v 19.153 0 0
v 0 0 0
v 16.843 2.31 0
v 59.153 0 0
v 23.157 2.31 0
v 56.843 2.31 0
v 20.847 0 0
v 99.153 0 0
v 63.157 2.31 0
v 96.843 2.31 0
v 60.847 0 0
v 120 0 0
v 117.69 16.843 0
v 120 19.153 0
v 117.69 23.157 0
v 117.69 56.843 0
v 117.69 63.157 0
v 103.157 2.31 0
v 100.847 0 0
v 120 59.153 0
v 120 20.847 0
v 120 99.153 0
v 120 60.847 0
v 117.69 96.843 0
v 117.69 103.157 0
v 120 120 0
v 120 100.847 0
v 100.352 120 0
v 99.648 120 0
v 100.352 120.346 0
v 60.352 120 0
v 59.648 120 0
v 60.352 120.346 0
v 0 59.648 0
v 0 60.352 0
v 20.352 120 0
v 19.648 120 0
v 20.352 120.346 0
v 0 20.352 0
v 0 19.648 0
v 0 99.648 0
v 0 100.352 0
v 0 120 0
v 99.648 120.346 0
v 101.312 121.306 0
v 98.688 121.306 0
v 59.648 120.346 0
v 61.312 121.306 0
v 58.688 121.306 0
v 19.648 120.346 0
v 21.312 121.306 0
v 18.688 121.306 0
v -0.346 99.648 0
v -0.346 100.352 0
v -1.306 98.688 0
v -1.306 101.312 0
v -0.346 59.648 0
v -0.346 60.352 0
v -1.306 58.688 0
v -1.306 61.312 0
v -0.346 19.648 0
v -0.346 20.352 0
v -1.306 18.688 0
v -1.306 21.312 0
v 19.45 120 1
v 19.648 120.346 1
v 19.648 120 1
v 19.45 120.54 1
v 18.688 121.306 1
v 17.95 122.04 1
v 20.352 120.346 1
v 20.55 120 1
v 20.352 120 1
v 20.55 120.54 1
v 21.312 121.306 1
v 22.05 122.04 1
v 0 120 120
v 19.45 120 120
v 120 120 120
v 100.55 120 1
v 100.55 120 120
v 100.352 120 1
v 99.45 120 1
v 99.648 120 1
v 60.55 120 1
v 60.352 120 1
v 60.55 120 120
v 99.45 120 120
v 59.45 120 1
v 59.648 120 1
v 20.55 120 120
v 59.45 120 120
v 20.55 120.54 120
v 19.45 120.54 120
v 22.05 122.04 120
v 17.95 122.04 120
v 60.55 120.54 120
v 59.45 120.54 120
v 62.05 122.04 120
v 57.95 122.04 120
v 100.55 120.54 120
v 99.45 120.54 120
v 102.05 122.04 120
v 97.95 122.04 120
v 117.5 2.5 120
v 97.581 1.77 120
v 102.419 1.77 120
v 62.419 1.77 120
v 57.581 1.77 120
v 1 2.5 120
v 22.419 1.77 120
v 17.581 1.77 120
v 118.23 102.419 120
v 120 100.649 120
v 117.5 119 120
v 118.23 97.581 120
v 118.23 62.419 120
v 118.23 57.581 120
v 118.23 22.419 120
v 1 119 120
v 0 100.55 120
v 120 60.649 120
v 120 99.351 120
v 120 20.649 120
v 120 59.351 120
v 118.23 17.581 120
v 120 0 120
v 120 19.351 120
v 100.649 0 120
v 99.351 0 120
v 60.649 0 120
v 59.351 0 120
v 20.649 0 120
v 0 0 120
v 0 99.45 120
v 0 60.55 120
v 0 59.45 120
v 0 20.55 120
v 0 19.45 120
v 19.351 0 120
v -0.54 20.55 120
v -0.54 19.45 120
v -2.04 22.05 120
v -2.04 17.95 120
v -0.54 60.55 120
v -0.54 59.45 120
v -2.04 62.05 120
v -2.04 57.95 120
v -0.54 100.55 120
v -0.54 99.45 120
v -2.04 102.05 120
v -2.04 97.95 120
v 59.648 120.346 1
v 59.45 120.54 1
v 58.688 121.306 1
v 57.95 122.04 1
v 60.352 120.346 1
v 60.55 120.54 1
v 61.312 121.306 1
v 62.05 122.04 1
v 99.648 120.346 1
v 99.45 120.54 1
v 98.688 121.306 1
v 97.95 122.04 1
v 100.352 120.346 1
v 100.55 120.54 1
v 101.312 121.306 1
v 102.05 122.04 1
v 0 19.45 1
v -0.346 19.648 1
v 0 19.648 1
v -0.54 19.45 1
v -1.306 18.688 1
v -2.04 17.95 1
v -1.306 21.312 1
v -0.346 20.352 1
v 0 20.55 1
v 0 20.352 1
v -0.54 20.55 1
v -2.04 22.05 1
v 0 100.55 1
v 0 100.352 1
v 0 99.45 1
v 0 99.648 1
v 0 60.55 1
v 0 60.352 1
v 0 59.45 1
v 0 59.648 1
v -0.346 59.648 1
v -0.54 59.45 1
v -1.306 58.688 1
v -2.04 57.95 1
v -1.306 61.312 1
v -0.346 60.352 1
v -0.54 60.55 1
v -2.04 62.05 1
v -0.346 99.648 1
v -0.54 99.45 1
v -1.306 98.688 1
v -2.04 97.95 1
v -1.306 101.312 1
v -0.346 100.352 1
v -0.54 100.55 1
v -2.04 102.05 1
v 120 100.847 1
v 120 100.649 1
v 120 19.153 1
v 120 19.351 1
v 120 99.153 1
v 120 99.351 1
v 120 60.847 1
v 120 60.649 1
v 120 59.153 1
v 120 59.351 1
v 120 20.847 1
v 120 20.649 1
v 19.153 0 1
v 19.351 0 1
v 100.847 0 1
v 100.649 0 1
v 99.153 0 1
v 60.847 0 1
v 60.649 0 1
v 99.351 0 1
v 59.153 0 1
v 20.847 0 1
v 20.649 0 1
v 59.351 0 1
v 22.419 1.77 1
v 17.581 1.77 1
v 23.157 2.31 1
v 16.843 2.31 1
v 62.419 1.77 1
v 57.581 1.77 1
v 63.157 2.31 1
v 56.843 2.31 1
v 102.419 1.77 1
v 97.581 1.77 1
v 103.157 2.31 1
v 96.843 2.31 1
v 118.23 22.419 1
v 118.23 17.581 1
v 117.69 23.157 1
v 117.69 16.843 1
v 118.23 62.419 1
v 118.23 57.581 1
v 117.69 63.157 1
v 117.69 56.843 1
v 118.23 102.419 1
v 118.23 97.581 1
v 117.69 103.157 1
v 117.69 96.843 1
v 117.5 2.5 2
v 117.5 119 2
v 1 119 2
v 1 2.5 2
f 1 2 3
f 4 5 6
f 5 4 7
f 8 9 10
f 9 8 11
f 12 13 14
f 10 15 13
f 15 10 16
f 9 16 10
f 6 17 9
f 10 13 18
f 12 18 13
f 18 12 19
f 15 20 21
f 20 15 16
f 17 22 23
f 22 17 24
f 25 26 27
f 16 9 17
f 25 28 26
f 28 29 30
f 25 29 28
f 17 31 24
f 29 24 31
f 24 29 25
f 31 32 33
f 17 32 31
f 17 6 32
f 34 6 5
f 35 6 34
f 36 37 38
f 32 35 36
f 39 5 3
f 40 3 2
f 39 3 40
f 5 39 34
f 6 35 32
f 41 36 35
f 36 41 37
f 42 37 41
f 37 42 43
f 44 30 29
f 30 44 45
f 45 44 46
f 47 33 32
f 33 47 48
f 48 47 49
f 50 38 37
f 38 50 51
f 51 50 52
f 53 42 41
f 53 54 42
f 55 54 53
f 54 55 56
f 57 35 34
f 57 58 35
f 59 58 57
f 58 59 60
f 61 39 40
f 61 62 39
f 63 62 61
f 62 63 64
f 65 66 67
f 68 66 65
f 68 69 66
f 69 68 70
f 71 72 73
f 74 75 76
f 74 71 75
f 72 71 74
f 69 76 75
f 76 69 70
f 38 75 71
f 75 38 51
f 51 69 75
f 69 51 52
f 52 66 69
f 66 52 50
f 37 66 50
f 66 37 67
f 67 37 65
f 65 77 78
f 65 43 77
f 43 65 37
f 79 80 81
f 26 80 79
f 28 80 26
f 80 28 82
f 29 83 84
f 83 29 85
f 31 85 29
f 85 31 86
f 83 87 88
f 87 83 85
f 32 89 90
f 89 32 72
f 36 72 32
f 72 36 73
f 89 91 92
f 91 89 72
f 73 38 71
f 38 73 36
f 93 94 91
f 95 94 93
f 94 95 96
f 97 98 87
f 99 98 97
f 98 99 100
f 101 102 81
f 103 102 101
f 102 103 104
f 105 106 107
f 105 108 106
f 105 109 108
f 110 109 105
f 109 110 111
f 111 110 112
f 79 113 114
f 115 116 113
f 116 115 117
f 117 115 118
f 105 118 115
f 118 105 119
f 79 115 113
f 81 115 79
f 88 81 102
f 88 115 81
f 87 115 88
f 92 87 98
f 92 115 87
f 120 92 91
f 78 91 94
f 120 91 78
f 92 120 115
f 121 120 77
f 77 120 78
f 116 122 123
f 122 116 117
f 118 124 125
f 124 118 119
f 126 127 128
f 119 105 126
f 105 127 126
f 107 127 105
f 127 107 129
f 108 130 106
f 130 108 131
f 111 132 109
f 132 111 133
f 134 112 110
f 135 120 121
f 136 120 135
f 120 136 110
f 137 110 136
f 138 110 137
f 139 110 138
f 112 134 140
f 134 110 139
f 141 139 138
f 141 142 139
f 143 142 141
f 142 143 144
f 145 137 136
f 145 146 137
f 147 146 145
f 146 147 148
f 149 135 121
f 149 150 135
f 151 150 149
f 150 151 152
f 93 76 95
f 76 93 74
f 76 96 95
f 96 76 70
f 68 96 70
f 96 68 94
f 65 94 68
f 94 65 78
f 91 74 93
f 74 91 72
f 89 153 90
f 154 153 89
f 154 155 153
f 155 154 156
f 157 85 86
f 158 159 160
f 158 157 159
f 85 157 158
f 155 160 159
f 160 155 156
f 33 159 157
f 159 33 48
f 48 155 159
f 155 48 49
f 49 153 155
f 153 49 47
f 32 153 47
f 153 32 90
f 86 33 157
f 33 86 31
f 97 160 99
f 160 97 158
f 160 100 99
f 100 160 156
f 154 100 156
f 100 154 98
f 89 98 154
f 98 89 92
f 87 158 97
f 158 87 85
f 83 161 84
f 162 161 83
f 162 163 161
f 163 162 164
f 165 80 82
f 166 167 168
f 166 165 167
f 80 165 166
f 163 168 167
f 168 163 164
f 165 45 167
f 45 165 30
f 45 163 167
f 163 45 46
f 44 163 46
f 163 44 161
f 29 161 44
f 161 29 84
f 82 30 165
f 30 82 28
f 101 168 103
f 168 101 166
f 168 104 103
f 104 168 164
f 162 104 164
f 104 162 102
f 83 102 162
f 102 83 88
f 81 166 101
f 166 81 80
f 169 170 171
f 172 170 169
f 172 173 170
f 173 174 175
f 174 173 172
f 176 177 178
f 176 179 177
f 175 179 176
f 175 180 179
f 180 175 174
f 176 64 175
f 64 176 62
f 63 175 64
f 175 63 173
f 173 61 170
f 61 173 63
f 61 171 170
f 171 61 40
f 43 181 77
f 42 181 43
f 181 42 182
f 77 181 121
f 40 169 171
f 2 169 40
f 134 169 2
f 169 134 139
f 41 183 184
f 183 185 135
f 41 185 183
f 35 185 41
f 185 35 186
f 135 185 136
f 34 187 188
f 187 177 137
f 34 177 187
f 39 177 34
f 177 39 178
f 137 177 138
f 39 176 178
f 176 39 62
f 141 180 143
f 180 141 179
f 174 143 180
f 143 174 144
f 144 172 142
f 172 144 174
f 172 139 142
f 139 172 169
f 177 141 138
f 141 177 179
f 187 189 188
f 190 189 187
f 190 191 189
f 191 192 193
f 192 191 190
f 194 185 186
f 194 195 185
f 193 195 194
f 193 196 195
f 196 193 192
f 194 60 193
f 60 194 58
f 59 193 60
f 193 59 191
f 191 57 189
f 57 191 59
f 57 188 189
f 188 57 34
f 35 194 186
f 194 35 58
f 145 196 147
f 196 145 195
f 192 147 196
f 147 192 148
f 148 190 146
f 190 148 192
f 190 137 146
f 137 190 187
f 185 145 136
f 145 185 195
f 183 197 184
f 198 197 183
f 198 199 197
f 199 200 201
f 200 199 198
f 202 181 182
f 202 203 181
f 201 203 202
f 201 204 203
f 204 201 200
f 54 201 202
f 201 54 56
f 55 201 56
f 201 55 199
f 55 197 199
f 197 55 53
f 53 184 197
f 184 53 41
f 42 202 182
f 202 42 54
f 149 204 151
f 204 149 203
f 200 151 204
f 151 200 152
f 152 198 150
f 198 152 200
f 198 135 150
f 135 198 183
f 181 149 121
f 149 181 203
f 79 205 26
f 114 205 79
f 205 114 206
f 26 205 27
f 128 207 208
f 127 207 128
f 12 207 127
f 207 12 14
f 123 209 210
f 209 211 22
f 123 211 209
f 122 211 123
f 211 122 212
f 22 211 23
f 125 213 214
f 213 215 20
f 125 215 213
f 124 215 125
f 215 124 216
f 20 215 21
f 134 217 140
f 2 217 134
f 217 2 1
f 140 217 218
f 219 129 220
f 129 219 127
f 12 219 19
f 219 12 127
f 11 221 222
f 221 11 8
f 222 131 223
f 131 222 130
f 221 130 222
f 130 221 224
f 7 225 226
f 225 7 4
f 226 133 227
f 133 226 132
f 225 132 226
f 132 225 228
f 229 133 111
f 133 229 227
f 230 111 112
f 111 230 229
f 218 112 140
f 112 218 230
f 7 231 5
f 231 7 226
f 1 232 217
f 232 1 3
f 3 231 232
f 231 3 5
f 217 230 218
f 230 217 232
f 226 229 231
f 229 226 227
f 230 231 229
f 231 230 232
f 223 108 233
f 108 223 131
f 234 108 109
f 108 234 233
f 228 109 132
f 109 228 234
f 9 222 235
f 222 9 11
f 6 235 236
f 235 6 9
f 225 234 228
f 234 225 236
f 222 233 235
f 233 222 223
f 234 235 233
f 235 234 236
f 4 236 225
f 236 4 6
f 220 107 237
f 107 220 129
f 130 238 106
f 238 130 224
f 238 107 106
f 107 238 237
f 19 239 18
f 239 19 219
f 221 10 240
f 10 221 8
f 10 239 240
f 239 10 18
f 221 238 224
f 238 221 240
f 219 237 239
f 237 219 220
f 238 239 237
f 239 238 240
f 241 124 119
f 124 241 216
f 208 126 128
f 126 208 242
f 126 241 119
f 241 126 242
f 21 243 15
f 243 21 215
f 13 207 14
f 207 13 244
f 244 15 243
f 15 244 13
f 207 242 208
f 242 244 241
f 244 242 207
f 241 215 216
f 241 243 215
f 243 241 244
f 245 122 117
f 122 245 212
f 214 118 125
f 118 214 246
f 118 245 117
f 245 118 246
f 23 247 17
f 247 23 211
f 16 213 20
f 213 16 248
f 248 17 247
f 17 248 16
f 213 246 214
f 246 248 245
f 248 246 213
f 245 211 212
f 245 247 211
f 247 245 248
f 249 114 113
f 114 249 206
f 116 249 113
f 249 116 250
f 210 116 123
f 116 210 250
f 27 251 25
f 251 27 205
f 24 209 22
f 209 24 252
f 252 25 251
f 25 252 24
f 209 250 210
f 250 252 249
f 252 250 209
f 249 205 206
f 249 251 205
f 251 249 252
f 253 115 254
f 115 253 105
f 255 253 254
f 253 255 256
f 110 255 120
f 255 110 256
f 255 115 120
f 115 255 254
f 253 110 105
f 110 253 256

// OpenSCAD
echo(version=version(2.0));
//comments: Version 2 adds anti-"elephant foot" scaling at bottom of dovetail sections
/* [Size] */
//Box unit size in mm. This defines the size of 1 'unit' for your box.
BoxUnits = 40;
//Box Width in units
BoxWidthUnits = 3;
BoxWidth = BoxWidthUnits * BoxUnits;
//Box Length in units
BoxLengthUnits = 3;
BoxLength = BoxLengthUnits * BoxUnits;
//Box Height in mm
BoxHeight = 120;
//Box Wall Thickness in mm
BoxWall = 1;
//Box Floor Thickness in mm
BoxFloor = 2;
//Fit Factor. Greater factor = looser fit
FitFactor = 0.18;  // [0:0.05:0.4]
//RoundedBottom = "EW"; // [EW:East-West, NS:North-South]
RoundedBottom = ""; // [EW:East-West, NS:North-South]

/* [Walls] */
//North Wall open or closed
NorthWallOpen = 0; // [0:Closed, 1:Open]
//South Wall open or closed
SouthWallOpen = 0; // [0:Closed, 1:Open]

/* [Dovetail] */
//Dovetail inside length in mm
DTInsideLength = 1.1;
//Dovetail angle in degrees
DTAngle = 45;
//Dovetail width in mm
DTWidth = 1.5;

/* [Hidden] */
//This helps calculate the length of the 'long' side of the dovetail
DTx=tan(DTAngle)*DTWidth;
//This polygon defines the dovetail shape
DTShape = [[0,0],[DTInsideLength/2,0],[DTInsideLength/2+DTx,DTWidth],[-DTInsideLength/2-DTx,DTWidth],[-DTInsideLength/2,0]];

//this section defines a module for creating a "rounded" bottom to the box, useful when storing small parts
module RoundBottom(width, length, height){    
    translate([0,length,0])rotate([90,0,0])
    linear_extrude(length, center=false)
    
    difference() {
        translate([-width/2,0,0])square([width,height/2],center=false);
        translate([0,height/2,0])resize([width,height]) circle(d=width*10);
    }
}



union(){
    //creates and transforms rounded bottom
    if (RoundedBottom=="EW") {
    translate([0,(BoxWidth/2)+BoxWall,BoxFloor])
    rotate([0,0,-90])
    RoundBottom(BoxWidth-DTWidth-(BoxWall),BoxLength-DTWidth-BoxWall,2*(BoxHeight-BoxFloor));
    }

    //creates rounded bottom oriented North-South
    if (RoundedBottom=="NS") {
    translate([(BoxLength/2)-BoxWall,DTWidth+BoxWall/2,BoxFloor])
    rotate([0,0,0])
    RoundBottom(BoxLength-DTWidth-(BoxWall),BoxWidth-DTWidth-BoxWall,2*(BoxHeight-BoxFloor));
    }

    //Creates main box,without round bottom
    difference(){
        
    union(){
        //main box
    cube([BoxLength,BoxWidth,BoxHeight], center=false);

        //male dovetails
    for (i=[1:BoxLengthUnits])
    translate([(i-1)*BoxUnits+(BoxUnits/2),BoxWidth,0])
        //in 2 sections. first section is slightly scaled down to counter "elephant foot"
        union(){
            linear_extrude(height=1, center=false)
                scale([1-(2*FitFactor),1-(2*FitFactor),1])
                union(){        
                    //this adds a slight offset to the male dovetail for a looser fit
                    translate([-DTInsideLength/2,0,0])
                    square([DTInsideLength,DTWidth]);
                    //main dovetail shape
                    translate([0,DTWidth*FitFactor*2,0])
                    polygon(DTShape);
                };
            translate([0,0,1])
            linear_extrude(height=BoxHeight-1, center=false)
                    union(){
                    //this adds a slight offset to the male dovetail for a looser fit
                    translate([-DTInsideLength/2,0,0])
                    square([DTInsideLength,DTWidth]);
                    //main dovetail shape
                    translate([0,DTWidth*FitFactor*2,0])
                    polygon(DTShape);
                    };
        }        

    for (i=[1:BoxWidthUnits])
    translate([0,(i-1)*BoxUnits+(BoxUnits/2),0])
        //in 2 sections. first section is slightly scaled down to counter "elephant foot"
        rotate([0,0,90])
        union(){
            linear_extrude(height=1, center=false)				//1mm high anti-elephant foot section
                scale([1-(2*FitFactor),1-(2*FitFactor),1])
                union(){        
                    //this adds a slight offset to the male dovetail for a looser fit
                    translate([-DTInsideLength/2,0,0])
                    square([DTInsideLength,DTWidth]);
                    //main dovetail shape
                    translate([0,DTWidth*FitFactor*2,0])
                    polygon(DTShape);
                };
            translate([0,0,1])
            linear_extrude(height=BoxHeight-1, center=false)
                union(){
                    //male dovetail offset
                    translate([-DTInsideLength/2,0,0])
                    square([DTInsideLength,DTWidth]);
                    //main dovetail shape
                    translate([0,DTWidth*FitFactor*2,0])
                    polygon(DTShape);
                };
        }
    }
    //female dovetails
    for (i=[1:BoxLengthUnits])
        union(){
            translate([(i-1)*BoxUnits+(BoxUnits/2),0,0])
                scale([1+FitFactor,1+FitFactor,1])
                linear_extrude(height=BoxHeight, center=false)
                polygon(DTShape);
        
            //added a second dovetail cutout at the bottom, scaled up to counter "elephant foot" when printed
            translate([(i-1)*BoxUnits+(BoxUnits/2),0,0])
                scale([1+(3*FitFactor),1+(3*FitFactor),1])
                linear_extrude(height=1, center=false)
                polygon(DTShape);					
        }

    for (i=[1:BoxWidthUnits])
        union(){
            translate([BoxLength,(i-1)*BoxUnits+(BoxUnits/2),0])
                rotate([0,0,90])
                    scale([1+FitFactor,1+FitFactor,1])
                        linear_extrude(height=BoxHeight, center=false)
                            polygon(DTShape);
            //added a second dovetail cutout at the bottom, scaled up to counter "elephant foot" when printed
            translate([BoxLength,(i-1)*BoxUnits+(BoxUnits/2),0])
                rotate([0,0,90])
                    scale([1+(3*FitFactor),1+(3*FitFactor),1])
                        linear_extrude(height=1, center=false)
                            polygon(DTShape);	
        }
    //carves out main box
    translate([BoxWall,DTWidth+BoxWall,BoxFloor])
        cube([BoxLength-(2*BoxWall)-DTWidth, (BoxWidth-(2*BoxWall)-DTWidth), BoxHeight]);

    if (NorthWallOpen)
        translate([-DTWidth*(1+FitFactor+FitFactor),BoxWall+DTWidth,BoxFloor], center=false)
            cube([BoxWall+(DTWidth*(1+FitFactor+FitFactor)), (BoxWidth-(2*BoxWall)-DTWidth), BoxHeight]);    

    if (SouthWallOpen)
        translate([BoxLength-(BoxWall)-DTWidth,BoxWall+DTWidth,BoxFloor], center=false)
            cube([BoxWall+DTWidth, (BoxWidth-(2*BoxWall)-DTWidth), BoxHeight]);


    }

    //
    }

/*
difference(){
    linear_extrude(height=h)
        offset(r=5)
        offset(r=-5)
        polygon(Poly1);

    linear_extrude(height=h)
        offset(r=5)
        offset(r=-10)
        polygon(Poly1);

    translate([w2,0,0])
    rotate([0,-90,0])
    linear_extrude(height=BackWidth)
        polygon(Poly2);
    
    for (a =[0:NumSlots-1])
     translate([0, FrontOffset+Slot1+(a*SlotSpacing)+(0*SlotSizeStep), BottomOffset +((a)*tan(SlotBottomSlope)*SlotSpacing)])
        rotate([-SlotAngle,0,0])
            translate([-(BackWidth/2),-(Slot1+a*SlotSizeStep),0])
            cube([BackWidth,Slot1+(a*SlotSizeStep),SlotDepth], center=false); 
}
*/
